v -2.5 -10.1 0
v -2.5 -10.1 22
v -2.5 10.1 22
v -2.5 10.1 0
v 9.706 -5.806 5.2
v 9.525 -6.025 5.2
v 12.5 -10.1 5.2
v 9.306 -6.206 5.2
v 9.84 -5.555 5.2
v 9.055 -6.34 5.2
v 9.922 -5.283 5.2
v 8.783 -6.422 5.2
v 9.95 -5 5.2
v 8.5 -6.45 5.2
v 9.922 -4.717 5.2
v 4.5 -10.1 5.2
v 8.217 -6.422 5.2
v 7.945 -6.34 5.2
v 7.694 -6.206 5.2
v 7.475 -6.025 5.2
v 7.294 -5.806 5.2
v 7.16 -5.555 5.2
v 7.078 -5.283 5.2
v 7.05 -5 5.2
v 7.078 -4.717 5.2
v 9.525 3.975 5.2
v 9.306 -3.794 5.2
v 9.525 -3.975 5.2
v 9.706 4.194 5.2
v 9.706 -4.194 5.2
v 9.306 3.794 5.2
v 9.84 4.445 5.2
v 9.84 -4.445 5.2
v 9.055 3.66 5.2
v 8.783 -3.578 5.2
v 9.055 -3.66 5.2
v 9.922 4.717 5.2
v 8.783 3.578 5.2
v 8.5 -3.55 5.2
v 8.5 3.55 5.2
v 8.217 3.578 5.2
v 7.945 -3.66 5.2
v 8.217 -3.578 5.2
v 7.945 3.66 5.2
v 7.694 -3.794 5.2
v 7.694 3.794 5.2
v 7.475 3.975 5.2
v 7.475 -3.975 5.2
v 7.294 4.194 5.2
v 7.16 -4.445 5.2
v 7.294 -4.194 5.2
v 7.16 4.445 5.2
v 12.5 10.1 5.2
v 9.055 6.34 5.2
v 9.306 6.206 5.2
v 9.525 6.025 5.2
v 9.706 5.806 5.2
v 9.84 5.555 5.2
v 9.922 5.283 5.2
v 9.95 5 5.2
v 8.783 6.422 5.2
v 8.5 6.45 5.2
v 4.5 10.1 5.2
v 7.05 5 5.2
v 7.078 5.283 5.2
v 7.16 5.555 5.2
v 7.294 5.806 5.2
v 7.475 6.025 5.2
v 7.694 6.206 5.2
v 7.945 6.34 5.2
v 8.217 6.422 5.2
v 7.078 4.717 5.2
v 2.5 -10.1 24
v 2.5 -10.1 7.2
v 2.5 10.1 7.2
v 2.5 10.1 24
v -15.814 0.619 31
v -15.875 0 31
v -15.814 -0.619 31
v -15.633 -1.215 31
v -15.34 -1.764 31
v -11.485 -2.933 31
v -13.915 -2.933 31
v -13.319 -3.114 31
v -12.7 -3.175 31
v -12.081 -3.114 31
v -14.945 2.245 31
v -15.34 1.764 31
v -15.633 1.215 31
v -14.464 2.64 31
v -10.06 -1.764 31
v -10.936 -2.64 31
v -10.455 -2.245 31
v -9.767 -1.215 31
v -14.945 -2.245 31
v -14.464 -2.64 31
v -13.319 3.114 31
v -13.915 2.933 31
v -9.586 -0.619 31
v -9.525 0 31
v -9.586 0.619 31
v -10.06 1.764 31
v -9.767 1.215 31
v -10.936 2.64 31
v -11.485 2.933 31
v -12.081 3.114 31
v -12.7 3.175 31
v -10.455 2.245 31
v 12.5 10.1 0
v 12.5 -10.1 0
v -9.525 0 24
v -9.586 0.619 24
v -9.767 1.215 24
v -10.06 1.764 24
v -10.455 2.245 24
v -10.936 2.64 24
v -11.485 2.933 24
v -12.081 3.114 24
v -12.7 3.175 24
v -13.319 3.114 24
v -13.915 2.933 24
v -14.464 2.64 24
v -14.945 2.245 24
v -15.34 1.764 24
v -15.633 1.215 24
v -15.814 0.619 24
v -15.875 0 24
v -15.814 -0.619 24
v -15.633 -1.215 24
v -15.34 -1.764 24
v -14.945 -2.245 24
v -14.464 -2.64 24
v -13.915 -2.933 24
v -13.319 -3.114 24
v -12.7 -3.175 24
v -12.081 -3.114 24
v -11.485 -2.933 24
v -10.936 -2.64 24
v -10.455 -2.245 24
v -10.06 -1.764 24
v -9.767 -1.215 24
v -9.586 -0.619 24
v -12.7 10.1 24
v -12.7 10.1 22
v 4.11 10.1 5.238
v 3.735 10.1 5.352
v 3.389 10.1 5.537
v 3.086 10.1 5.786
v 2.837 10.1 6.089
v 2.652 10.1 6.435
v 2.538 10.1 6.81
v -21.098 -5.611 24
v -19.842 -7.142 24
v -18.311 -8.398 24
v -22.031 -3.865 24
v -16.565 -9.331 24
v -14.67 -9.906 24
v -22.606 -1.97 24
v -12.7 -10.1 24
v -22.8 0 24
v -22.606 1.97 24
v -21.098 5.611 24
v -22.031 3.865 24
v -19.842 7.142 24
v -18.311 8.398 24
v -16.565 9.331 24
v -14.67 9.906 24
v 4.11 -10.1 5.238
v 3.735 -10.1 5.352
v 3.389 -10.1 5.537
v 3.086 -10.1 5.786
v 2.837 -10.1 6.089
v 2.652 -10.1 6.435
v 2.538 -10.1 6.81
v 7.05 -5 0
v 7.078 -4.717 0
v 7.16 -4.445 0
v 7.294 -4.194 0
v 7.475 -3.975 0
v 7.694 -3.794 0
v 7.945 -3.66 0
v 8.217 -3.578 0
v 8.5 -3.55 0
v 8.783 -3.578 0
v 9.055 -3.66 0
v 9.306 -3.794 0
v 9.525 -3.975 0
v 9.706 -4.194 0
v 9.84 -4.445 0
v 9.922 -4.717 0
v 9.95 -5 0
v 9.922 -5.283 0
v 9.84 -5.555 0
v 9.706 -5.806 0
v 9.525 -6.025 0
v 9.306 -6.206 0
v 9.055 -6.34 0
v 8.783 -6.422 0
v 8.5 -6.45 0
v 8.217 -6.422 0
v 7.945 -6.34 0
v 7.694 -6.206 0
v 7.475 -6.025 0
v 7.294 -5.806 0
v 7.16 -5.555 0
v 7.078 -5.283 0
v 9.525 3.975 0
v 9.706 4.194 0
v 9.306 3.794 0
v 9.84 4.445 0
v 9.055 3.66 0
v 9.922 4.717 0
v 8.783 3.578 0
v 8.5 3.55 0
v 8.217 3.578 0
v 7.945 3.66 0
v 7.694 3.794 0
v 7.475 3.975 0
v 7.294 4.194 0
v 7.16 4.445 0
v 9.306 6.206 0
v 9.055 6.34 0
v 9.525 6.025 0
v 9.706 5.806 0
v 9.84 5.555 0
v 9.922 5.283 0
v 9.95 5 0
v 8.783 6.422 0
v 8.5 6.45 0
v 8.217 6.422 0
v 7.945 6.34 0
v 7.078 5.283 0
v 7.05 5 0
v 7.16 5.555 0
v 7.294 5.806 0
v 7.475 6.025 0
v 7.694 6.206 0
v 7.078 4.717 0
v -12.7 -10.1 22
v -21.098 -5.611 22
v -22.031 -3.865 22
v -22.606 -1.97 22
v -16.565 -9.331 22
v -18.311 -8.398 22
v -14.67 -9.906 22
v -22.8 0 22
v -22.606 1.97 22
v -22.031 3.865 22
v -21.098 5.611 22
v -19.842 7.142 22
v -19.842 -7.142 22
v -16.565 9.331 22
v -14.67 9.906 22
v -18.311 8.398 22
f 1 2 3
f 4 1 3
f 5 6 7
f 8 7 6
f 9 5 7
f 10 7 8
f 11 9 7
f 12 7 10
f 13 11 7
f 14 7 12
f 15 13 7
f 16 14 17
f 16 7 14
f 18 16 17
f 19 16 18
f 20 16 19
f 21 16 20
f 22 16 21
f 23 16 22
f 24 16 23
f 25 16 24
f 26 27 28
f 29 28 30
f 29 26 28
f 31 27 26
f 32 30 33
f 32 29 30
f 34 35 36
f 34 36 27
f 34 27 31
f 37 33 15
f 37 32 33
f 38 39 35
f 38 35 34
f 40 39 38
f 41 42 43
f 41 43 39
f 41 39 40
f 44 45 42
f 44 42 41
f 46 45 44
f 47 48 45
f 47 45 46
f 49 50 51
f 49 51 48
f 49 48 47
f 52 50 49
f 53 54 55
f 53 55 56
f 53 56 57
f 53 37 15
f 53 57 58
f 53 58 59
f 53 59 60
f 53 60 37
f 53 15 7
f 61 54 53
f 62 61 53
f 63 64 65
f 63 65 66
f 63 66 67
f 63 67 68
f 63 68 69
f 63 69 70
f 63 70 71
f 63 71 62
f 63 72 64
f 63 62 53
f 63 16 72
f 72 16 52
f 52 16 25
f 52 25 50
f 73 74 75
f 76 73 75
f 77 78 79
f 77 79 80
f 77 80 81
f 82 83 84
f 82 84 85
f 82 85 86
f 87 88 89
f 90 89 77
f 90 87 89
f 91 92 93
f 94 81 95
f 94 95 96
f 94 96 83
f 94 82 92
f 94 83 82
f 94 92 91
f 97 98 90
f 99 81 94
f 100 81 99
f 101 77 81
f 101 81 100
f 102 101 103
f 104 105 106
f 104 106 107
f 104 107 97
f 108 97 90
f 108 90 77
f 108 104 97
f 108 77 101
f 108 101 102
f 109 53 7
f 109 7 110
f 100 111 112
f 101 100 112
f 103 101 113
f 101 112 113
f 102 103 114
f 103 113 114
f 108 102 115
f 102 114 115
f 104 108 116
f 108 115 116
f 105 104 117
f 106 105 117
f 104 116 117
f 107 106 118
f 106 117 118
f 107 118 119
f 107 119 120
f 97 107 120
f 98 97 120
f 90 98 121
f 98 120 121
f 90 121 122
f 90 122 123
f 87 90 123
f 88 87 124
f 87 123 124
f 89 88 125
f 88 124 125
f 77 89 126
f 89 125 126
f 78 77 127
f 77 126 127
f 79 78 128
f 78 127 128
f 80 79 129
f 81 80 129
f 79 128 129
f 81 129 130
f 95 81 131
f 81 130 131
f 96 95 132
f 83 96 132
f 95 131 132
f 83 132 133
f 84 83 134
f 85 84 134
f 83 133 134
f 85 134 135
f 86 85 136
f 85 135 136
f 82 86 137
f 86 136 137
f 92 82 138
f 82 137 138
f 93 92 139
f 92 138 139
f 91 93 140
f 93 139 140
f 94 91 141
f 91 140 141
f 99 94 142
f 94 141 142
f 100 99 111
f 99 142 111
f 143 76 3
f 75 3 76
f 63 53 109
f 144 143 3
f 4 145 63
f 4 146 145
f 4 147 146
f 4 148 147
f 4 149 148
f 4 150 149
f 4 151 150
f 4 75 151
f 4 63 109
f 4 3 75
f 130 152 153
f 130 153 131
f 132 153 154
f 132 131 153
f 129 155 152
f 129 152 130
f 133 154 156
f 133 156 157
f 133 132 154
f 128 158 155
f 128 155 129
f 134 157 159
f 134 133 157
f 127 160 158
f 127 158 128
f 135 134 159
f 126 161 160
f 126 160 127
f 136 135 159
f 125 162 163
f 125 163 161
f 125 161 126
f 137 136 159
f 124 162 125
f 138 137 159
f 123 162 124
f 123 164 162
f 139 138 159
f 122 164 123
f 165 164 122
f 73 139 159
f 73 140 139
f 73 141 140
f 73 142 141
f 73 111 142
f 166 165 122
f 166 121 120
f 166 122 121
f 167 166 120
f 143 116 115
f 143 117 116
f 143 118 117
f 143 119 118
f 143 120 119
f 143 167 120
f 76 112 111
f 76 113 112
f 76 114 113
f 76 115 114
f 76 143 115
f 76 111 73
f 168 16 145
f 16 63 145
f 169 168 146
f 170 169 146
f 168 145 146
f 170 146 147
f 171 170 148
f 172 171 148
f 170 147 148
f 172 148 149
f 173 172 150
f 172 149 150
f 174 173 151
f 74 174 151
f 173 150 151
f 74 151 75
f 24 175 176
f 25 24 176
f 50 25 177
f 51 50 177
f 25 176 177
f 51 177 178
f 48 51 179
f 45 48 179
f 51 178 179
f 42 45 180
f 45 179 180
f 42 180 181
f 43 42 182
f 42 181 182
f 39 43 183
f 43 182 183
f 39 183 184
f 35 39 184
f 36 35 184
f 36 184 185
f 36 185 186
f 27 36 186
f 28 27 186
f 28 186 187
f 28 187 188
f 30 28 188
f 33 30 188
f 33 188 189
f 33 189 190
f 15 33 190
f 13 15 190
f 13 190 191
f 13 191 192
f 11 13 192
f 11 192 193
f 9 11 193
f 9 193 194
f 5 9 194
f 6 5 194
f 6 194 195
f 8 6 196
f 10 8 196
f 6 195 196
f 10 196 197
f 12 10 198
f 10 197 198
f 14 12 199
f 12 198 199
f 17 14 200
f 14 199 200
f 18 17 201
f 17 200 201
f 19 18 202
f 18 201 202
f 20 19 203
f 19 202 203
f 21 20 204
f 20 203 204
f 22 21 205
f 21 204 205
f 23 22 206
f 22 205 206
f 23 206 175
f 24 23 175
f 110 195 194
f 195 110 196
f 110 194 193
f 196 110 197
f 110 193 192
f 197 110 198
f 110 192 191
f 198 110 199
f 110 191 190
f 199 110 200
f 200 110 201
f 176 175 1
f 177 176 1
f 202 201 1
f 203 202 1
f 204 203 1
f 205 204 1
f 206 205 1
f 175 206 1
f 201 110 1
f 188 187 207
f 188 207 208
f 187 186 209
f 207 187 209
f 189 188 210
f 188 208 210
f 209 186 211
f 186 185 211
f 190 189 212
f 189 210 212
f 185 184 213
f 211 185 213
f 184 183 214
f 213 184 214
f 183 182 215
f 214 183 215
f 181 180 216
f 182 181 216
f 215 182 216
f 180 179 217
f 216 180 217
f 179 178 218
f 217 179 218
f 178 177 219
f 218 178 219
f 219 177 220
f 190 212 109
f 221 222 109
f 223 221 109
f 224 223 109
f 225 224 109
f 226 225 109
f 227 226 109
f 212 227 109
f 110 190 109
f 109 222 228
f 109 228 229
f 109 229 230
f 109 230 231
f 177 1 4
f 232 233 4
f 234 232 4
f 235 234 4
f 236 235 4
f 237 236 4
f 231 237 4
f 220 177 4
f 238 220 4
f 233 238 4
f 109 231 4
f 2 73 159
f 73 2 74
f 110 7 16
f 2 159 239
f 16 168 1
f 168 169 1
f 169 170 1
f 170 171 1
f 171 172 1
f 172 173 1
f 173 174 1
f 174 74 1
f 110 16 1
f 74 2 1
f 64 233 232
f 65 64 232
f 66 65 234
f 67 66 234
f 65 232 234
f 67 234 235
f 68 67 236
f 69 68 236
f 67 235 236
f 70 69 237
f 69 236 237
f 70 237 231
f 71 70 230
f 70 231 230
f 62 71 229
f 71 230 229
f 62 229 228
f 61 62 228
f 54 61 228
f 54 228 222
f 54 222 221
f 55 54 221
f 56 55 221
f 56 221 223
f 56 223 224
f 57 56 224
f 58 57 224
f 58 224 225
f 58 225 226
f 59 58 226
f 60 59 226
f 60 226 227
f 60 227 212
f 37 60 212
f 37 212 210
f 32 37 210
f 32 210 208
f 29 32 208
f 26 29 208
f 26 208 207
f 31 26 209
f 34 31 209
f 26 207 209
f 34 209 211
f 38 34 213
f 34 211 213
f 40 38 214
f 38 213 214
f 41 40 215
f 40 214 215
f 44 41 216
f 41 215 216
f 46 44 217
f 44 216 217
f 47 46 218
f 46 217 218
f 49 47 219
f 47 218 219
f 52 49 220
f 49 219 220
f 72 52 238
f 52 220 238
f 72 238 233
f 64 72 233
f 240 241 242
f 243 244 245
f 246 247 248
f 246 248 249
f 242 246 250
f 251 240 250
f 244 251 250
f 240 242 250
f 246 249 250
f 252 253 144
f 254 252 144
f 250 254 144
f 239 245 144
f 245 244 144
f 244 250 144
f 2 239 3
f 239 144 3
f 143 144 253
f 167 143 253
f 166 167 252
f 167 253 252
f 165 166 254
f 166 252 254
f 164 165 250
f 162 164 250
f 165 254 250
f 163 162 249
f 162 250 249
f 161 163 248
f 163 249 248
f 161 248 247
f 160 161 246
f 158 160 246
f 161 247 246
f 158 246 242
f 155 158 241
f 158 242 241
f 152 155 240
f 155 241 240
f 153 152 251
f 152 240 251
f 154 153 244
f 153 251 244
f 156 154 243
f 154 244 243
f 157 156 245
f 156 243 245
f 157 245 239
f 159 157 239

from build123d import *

# Parameters (mm, degrees)
ESQUISSE1_W         = 5
ESQUISSE1_H         = 20.2
BOSS_EXTRU_1_DEPTH  = 22
BOSS_EXTRU_2_DEPTH  = 2
ESQUISSE3_R         = 3.175
BOSS_EXTRU_3_DEPTH  = 7
SKETCH1_W           = 5.2
SKETCH1_H           = 20.2
BOSS_EXTRUDE1_DEPTH = 10
SKETCH2_R           = 1.45
CUT_EXTRUDE1_DEPTH  = 40.785047442
FILLET1_R           = 2


with BuildPart() as part:
    # Esquisse1 → Boss.-Extru.1 (new body)
    with BuildSketch(Plane.XY):
        Rectangle(ESQUISSE1_W, ESQUISSE1_H)
    extrude(amount=BOSS_EXTRU_1_DEPTH)

    # Esquisse2 → Boss.-Extru.2 (add)
    with BuildSketch(Plane.XY.offset(22)):
        with BuildLine():
            Line((2.5, 10.1), (-12.7, 10.1))
            ThreePointArc((-12.7, 10.1), (-22.8, 0), (-12.7, -10.1))
            Line((-12.7, -10.1), (2.5, -10.1))
            Line((2.5, -10.1), (2.5, 10.1))
        make_face()
    extrude(amount=BOSS_EXTRU_2_DEPTH)

    # Esquisse3 → Boss.-Extru.3 (add)
    with BuildSketch(Plane.XY.offset(24)):
        with Locations((-12.7, 0)):
            Circle(ESQUISSE3_R)
    extrude(amount=BOSS_EXTRU_3_DEPTH)

    # Sketch1 → Boss-Extrude1 (add)
    with BuildSketch(Plane(origin=(2.5, 0, 0), x_dir=(0, 0, -1), z_dir=(1, 0, 0))):
        with Locations((-2.6, 0)):
            Rectangle(SKETCH1_W, SKETCH1_H)
    extrude(amount=BOSS_EXTRUDE1_DEPTH)

    # Sketch2 → Cut-Extrude1 (cut, through all)
    with BuildSketch(Plane(origin=(0, 0, 0), x_dir=(-1, 0, 0), z_dir=(0, 0, -1))):
        with Locations((-8.5, -5)):
            Circle(SKETCH2_R)
        with Locations((-8.5, 5)):
            Circle(SKETCH2_R)
    extrude(amount=-CUT_EXTRUDE1_DEPTH, mode=Mode.SUBTRACT)

    # Fillet1
    fillet1_edges = [part.edges().sort_by_distance(p)[0] for p in [
        (2.5, 0, 5.2),
    ]]
    fillet(fillet1_edges, radius=FILLET1_R)


solid = part.part
